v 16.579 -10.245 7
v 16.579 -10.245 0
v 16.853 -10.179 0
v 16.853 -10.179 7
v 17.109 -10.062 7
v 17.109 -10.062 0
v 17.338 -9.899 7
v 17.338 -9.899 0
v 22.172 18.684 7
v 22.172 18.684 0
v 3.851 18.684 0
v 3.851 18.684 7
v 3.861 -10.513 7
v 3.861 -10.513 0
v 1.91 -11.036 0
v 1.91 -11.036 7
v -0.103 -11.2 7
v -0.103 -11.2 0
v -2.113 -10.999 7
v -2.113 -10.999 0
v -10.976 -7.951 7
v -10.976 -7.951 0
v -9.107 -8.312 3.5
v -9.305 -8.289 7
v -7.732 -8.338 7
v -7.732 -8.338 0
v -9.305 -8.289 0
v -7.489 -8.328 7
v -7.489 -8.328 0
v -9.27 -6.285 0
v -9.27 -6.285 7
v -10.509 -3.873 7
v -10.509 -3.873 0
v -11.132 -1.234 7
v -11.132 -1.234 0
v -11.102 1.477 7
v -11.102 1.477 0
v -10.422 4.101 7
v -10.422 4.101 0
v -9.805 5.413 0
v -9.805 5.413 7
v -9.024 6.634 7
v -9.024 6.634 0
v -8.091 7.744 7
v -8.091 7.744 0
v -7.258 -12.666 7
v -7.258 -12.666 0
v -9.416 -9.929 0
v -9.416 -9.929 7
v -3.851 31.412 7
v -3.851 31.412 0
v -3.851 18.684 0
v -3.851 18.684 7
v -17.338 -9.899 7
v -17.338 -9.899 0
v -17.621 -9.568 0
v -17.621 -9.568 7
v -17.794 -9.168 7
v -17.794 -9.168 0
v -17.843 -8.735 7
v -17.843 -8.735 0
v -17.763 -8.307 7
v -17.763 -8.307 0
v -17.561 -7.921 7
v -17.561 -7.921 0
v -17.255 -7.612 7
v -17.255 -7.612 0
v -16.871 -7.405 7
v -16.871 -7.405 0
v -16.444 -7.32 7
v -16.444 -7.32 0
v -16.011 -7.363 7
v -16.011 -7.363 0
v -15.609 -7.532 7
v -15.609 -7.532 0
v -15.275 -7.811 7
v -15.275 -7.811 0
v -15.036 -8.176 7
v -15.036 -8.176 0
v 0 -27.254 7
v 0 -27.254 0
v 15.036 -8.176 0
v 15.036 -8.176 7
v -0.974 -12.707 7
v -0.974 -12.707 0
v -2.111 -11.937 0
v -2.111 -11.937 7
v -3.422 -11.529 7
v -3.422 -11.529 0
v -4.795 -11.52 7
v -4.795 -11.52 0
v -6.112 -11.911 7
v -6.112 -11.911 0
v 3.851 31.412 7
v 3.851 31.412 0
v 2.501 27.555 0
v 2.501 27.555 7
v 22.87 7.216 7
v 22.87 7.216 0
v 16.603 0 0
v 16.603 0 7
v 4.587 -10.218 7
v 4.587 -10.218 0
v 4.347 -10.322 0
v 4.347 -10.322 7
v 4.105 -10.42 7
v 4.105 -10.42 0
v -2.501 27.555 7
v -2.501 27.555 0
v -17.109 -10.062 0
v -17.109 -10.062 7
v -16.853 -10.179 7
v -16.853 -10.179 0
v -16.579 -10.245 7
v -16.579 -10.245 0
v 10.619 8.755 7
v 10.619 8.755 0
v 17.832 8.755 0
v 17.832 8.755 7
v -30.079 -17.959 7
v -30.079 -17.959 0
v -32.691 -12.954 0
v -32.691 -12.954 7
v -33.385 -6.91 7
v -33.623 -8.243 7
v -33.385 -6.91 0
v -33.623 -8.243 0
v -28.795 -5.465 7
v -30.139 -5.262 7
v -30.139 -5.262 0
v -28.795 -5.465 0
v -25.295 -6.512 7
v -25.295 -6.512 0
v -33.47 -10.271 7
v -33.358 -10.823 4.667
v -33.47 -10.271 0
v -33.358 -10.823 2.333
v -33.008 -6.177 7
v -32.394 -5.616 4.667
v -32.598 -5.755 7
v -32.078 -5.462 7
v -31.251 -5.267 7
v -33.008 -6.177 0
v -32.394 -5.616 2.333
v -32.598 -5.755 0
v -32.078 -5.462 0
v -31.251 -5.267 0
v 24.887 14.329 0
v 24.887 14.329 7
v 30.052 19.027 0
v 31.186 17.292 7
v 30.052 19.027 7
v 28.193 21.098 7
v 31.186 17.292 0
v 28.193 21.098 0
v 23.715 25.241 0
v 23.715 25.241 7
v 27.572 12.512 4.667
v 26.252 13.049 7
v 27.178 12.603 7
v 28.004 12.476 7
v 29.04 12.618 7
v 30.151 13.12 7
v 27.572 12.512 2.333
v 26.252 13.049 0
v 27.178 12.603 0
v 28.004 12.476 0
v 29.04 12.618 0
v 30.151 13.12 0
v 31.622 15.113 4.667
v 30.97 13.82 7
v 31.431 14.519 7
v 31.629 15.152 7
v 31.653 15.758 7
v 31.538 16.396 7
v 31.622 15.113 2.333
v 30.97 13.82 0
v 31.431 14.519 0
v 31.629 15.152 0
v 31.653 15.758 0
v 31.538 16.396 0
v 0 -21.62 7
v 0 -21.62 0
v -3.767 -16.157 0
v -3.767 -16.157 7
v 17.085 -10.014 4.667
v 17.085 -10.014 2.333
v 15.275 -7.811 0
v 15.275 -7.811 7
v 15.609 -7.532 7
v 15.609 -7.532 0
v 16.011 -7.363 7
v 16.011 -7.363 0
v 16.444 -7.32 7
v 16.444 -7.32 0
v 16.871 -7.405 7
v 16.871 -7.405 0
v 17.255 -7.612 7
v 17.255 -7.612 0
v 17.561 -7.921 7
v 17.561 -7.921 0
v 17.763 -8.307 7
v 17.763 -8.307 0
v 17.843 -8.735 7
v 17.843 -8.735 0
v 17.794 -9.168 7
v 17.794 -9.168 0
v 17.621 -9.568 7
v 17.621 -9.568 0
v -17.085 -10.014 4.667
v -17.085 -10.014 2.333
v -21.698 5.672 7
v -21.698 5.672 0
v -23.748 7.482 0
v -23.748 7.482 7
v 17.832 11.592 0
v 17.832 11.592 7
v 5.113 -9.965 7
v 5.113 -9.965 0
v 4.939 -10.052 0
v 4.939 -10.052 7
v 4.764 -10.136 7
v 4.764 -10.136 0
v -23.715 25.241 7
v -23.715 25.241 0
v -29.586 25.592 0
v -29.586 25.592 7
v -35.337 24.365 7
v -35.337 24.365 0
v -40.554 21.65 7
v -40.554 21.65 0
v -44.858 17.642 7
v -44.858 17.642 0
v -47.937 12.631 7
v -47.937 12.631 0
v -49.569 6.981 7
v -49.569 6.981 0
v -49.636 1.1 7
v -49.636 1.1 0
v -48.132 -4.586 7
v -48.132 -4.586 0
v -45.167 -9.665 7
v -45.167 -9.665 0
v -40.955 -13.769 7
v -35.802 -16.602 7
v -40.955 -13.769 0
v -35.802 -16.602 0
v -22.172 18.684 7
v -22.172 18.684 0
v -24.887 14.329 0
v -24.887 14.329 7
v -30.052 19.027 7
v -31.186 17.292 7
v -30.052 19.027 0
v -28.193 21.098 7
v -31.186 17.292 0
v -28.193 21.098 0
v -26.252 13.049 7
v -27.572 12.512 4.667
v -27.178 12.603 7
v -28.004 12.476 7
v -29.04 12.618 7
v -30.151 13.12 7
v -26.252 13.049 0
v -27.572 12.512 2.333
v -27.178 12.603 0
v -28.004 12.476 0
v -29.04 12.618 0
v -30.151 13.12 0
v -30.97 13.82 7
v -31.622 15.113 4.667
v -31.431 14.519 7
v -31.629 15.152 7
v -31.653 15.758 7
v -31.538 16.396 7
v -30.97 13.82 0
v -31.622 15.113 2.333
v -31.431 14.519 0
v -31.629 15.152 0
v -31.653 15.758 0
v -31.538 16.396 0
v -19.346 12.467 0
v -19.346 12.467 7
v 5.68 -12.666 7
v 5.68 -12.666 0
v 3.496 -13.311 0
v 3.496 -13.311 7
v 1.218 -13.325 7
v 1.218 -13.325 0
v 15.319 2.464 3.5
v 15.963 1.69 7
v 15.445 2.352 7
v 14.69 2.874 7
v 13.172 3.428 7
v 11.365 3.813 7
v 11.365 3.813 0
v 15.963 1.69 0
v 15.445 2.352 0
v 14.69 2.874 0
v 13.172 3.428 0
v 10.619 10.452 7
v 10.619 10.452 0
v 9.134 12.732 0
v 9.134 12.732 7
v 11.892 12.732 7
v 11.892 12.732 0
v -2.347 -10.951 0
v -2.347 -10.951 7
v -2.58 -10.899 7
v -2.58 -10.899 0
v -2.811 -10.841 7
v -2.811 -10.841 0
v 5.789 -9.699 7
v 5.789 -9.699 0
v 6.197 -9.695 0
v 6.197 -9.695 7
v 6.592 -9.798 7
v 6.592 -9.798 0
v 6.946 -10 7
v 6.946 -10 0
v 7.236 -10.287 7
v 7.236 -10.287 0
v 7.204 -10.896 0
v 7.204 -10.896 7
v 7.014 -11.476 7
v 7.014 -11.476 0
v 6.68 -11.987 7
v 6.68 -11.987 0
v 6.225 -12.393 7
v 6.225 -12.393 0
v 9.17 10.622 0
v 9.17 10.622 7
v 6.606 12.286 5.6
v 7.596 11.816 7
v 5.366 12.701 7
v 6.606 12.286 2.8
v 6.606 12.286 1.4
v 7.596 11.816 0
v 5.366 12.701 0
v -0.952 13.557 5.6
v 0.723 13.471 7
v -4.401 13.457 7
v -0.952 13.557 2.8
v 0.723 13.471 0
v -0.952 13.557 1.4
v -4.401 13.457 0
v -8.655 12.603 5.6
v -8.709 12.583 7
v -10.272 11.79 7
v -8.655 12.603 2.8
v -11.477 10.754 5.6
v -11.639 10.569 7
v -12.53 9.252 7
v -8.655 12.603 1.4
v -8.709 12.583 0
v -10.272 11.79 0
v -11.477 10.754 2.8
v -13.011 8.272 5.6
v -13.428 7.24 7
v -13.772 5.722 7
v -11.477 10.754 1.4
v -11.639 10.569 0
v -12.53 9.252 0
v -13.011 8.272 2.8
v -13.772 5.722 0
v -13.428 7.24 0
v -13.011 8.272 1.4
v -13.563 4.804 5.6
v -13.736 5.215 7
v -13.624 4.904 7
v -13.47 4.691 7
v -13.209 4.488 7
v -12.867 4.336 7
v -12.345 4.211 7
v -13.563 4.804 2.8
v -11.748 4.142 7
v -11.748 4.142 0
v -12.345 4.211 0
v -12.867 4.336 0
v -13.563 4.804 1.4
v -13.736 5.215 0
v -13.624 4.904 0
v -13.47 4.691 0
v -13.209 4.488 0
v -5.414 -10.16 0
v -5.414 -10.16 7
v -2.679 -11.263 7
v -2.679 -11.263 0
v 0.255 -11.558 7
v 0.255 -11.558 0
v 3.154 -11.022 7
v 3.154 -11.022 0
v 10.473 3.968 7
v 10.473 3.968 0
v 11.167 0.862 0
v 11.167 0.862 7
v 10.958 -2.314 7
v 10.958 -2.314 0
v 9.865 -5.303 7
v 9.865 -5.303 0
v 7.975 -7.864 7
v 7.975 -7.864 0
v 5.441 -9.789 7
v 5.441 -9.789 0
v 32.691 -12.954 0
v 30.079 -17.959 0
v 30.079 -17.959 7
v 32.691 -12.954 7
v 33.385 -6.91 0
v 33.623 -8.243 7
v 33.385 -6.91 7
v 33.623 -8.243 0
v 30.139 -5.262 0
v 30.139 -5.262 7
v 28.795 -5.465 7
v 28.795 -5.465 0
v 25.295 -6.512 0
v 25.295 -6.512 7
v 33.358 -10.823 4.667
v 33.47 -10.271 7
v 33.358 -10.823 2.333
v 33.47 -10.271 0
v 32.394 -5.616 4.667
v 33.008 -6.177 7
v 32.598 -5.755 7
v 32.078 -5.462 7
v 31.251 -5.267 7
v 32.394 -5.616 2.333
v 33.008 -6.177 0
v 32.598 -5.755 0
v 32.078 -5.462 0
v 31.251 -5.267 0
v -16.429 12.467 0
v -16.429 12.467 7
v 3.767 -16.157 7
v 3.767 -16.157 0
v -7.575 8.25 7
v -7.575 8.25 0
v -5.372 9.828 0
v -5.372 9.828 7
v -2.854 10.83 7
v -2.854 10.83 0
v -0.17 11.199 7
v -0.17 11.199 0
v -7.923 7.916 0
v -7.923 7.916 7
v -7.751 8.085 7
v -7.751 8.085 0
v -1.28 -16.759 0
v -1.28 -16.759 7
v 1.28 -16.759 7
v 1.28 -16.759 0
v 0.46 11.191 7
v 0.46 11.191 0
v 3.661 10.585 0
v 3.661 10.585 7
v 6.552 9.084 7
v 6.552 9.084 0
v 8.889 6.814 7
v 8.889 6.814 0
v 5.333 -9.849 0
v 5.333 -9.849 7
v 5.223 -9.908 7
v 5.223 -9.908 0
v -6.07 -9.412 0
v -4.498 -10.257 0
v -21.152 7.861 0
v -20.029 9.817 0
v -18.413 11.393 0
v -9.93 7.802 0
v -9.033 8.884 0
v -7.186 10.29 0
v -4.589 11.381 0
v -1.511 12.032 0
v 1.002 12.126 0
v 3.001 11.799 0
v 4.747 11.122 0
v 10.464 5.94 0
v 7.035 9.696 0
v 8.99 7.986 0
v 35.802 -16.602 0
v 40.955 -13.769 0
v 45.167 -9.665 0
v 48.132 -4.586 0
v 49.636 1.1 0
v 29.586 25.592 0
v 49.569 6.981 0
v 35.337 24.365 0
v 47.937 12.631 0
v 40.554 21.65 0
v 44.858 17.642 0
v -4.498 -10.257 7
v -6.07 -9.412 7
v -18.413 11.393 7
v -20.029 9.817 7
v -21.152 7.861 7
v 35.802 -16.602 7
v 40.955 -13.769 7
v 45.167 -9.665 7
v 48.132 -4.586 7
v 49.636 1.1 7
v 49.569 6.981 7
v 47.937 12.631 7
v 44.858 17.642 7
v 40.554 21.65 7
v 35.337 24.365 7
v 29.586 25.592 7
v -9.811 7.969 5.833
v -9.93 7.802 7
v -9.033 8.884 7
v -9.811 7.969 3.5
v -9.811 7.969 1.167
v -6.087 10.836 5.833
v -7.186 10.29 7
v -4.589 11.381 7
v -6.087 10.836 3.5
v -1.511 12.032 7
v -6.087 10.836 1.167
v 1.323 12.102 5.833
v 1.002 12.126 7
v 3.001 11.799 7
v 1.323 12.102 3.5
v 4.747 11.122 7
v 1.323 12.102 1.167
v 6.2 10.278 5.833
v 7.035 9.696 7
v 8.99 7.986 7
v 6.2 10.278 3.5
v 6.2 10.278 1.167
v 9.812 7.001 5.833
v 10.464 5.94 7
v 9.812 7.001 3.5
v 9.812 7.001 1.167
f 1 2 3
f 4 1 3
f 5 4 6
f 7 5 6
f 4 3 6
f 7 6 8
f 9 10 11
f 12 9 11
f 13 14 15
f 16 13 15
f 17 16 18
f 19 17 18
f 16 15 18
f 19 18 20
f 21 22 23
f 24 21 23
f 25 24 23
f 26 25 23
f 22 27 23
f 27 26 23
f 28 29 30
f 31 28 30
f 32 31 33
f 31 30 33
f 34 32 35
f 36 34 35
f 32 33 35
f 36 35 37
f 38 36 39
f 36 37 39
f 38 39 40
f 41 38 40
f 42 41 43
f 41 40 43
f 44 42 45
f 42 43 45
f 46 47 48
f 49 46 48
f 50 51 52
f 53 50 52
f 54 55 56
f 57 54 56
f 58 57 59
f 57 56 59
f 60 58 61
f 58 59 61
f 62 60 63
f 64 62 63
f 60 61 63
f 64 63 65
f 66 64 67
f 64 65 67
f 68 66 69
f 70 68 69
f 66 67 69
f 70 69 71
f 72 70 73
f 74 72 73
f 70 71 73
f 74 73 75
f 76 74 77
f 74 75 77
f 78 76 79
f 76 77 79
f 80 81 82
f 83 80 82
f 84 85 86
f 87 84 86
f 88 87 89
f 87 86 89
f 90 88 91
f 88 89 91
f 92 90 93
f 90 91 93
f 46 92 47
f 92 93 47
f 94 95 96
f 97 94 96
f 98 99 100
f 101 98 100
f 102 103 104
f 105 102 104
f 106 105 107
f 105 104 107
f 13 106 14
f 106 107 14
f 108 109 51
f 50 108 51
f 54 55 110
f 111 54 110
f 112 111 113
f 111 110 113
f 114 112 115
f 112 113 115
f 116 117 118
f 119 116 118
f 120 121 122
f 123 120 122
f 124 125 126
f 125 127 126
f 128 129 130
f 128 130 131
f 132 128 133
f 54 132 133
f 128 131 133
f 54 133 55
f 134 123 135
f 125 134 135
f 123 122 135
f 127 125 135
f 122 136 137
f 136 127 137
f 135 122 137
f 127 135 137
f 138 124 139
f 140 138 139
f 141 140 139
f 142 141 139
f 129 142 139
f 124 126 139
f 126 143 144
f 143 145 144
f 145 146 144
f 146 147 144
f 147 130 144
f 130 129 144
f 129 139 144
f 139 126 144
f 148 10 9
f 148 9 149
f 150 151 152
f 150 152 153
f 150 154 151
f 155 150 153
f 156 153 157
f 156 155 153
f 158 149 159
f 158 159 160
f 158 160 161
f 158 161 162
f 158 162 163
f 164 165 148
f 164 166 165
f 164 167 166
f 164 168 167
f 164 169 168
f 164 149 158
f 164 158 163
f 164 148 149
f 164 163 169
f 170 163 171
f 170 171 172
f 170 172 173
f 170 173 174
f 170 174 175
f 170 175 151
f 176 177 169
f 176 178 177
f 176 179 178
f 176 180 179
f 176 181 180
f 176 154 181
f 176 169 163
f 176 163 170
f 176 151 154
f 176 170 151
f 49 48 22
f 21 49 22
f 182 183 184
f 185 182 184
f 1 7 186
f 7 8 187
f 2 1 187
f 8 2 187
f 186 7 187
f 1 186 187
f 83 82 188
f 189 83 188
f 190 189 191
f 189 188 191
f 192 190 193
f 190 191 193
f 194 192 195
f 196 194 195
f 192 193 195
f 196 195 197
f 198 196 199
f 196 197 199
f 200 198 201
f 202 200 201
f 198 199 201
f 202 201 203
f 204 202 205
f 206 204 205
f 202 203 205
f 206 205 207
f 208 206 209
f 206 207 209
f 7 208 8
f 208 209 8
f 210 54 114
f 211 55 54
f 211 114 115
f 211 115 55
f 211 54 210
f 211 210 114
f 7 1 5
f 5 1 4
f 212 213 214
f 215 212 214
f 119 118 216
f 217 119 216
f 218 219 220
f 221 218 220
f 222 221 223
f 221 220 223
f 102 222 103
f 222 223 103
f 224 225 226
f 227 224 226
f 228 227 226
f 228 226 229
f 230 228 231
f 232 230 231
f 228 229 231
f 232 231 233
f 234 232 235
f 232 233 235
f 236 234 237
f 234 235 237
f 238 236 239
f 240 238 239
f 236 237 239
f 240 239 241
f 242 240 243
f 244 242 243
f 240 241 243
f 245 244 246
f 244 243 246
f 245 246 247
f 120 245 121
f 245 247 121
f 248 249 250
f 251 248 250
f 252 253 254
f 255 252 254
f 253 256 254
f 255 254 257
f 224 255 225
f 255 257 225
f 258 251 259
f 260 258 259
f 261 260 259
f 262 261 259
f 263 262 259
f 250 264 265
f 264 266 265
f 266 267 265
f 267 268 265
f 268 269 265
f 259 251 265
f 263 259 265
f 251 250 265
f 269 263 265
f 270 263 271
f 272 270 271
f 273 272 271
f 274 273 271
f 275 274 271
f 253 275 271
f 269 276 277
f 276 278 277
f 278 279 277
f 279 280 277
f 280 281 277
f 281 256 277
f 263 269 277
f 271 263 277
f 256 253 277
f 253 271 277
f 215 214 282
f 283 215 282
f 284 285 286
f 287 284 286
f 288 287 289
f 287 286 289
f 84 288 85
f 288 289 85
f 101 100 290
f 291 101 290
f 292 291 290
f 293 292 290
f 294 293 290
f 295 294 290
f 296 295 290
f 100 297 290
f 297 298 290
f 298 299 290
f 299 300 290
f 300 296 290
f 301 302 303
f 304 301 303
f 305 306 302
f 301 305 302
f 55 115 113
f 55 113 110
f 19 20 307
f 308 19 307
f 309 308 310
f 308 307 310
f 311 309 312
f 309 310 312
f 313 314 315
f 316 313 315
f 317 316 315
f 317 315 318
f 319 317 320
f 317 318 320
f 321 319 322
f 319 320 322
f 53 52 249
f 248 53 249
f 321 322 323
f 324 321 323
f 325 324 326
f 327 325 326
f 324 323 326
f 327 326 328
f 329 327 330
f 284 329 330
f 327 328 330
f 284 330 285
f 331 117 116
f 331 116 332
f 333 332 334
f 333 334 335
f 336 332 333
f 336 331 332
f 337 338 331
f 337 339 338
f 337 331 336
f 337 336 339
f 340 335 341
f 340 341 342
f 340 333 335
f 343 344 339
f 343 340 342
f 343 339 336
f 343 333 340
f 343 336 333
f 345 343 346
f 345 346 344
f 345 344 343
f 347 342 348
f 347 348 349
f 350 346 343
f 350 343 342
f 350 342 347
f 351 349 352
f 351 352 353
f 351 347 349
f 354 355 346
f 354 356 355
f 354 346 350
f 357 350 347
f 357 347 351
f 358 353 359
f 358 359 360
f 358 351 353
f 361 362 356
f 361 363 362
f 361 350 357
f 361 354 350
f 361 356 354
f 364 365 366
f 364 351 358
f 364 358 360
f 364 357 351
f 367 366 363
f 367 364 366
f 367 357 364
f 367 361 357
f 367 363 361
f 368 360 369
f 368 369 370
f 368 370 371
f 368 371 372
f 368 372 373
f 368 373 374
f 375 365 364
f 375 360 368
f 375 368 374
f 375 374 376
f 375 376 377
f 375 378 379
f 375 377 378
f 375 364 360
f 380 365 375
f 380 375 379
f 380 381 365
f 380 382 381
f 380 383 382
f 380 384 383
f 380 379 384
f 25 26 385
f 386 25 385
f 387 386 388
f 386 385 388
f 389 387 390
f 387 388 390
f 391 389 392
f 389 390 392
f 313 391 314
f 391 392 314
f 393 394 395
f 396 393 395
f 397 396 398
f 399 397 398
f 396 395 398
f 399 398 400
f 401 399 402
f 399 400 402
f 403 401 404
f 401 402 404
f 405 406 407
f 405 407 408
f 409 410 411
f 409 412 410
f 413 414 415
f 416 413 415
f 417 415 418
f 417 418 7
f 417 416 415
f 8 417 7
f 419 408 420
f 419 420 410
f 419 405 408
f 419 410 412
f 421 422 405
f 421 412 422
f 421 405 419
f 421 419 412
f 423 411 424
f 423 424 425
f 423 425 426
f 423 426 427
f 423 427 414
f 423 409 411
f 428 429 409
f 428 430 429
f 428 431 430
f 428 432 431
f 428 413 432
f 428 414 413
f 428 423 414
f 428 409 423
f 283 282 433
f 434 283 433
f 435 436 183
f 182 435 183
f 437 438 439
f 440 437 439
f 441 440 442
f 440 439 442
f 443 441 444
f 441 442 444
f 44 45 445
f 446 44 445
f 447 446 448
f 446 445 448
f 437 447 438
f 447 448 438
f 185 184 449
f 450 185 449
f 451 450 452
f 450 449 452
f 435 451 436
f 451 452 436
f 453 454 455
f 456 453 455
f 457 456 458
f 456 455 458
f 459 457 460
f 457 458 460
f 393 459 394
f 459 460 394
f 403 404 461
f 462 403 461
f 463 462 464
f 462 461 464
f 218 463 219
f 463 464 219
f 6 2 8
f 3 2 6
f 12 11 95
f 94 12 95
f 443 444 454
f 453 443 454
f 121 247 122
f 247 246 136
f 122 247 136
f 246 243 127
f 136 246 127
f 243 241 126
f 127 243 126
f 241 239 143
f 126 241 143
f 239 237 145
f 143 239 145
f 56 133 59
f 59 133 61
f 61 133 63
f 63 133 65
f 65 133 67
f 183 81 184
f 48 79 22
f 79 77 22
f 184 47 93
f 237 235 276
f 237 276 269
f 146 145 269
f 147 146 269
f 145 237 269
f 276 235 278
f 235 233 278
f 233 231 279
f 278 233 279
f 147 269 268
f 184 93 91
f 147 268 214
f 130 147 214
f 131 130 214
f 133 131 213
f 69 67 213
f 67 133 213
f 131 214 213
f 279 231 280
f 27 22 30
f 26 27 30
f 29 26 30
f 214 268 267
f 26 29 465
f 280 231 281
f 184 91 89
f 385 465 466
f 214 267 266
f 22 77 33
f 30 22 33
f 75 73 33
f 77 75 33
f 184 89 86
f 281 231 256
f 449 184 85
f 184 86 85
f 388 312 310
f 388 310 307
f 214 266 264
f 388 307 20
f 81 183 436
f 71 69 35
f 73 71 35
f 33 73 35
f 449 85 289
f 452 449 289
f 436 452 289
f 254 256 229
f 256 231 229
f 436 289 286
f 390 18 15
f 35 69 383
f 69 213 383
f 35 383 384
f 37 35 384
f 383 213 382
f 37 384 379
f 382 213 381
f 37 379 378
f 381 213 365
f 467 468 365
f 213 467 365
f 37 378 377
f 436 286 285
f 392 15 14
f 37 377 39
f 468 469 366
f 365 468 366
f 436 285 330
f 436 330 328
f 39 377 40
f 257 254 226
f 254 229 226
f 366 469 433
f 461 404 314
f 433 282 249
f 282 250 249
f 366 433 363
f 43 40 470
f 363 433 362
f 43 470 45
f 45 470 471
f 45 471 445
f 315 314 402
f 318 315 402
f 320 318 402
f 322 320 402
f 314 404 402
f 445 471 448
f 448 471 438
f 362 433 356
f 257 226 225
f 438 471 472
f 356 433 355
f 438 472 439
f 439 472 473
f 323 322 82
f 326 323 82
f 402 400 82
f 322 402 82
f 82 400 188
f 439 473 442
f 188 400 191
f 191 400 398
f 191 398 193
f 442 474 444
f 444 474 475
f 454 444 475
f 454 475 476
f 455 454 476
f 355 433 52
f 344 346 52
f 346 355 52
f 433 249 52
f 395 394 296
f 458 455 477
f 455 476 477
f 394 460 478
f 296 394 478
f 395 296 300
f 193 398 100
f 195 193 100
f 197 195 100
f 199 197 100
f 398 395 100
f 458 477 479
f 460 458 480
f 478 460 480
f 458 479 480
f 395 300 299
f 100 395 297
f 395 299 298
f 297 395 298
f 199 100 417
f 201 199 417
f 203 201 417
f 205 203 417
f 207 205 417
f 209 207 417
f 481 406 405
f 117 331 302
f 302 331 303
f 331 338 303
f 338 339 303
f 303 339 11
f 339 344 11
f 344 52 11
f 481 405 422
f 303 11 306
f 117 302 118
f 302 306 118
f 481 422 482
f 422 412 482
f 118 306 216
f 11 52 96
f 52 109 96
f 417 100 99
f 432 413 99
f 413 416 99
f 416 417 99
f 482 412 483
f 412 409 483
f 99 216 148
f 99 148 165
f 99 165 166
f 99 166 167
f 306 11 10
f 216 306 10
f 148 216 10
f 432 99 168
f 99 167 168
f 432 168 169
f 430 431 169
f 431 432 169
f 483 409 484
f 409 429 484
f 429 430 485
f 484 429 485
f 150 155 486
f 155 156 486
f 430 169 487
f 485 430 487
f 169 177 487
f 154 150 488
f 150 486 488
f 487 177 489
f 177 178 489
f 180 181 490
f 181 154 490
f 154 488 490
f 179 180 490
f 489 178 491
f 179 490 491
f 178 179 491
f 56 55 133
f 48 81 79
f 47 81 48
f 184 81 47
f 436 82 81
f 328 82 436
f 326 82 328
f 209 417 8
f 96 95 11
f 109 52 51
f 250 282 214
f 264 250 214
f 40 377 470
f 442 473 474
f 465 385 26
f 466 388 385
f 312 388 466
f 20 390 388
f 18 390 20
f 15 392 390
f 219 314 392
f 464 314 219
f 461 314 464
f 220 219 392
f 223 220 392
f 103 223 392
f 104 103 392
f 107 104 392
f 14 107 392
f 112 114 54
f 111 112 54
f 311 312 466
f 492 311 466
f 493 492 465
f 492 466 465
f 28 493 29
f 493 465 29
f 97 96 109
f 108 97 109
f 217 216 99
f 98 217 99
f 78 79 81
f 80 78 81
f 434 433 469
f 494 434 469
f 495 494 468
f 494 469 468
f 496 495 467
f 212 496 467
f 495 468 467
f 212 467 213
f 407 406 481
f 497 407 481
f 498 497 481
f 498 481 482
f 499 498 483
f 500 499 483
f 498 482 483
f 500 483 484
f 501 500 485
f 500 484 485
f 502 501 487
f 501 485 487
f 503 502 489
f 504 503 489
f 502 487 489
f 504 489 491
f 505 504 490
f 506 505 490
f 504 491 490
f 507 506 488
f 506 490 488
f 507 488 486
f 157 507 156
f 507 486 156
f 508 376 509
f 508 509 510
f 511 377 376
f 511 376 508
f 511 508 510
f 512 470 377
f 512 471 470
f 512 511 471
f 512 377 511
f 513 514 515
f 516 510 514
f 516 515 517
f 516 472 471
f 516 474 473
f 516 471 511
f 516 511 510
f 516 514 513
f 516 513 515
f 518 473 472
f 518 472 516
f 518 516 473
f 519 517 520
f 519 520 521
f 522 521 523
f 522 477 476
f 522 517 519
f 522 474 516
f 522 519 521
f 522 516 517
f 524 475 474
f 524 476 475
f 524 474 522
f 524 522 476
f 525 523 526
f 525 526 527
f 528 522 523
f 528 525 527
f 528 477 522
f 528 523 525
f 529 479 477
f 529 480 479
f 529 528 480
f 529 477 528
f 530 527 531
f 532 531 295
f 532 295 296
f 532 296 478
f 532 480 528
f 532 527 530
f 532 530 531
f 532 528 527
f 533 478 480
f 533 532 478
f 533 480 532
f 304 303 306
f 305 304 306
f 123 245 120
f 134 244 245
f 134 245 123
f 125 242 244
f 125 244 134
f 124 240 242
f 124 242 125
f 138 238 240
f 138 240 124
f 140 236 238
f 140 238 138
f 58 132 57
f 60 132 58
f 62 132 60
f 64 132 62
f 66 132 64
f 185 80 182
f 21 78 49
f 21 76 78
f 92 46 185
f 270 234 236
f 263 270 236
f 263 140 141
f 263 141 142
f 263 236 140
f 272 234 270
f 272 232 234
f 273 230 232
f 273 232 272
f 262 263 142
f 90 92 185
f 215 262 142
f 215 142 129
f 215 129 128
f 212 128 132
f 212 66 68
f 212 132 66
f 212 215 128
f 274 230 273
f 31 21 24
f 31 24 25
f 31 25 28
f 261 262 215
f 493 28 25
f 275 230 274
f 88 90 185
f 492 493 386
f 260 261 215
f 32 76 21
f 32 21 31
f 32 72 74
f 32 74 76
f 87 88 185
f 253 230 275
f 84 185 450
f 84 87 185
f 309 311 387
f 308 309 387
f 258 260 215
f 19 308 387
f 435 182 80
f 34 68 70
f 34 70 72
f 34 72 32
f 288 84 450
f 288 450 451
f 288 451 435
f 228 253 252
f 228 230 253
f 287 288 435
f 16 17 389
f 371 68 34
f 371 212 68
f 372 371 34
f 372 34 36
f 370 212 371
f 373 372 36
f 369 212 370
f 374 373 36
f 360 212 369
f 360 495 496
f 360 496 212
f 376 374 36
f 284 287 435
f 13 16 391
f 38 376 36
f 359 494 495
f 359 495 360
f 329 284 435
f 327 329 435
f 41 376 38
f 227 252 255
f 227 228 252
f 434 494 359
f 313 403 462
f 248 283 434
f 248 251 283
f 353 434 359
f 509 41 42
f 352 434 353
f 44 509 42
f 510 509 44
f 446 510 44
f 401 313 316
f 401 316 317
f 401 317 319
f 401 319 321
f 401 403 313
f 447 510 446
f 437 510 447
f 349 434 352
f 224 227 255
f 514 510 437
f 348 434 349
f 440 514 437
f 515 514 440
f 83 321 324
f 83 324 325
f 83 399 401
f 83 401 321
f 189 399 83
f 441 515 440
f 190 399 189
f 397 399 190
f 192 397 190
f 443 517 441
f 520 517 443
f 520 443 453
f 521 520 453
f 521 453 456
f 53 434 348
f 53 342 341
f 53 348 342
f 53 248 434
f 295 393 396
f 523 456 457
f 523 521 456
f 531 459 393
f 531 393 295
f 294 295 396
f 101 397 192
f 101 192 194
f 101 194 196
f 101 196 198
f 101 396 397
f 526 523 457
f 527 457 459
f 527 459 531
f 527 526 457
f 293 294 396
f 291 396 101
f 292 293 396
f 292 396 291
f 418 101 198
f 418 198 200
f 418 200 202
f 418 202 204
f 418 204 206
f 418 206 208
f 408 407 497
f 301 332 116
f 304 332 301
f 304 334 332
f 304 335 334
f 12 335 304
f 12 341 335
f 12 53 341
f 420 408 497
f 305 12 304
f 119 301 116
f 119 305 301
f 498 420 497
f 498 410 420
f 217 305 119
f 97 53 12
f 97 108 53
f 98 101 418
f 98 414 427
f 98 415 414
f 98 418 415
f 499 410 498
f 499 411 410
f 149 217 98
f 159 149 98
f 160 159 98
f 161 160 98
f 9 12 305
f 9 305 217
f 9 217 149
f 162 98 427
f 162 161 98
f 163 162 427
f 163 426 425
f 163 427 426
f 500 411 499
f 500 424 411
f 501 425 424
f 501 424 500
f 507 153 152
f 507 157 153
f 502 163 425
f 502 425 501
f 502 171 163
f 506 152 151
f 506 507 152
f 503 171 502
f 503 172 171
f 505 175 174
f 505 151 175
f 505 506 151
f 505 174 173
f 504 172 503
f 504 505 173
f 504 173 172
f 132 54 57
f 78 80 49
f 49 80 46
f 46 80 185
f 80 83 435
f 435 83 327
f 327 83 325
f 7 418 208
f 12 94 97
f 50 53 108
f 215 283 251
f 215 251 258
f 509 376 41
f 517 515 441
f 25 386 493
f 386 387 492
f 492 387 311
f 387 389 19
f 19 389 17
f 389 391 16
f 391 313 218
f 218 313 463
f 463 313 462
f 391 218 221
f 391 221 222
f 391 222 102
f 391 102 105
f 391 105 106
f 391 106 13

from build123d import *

# Parameters (mm, degrees)
F1_DEPTH = 7


# Not quite as in the source:
# - a feature names something its author has since deleted; it is built from what else it names


with BuildPart() as f1:
    # F0 (on Top) → F1 (new body)
    with BuildSketch(Plane.XY):
        with BuildLine():
            ThreePointArc((16.5792349726, -10.2448631078), (16.9834682398, -10.1267607204), (17.3376568133, -9.8989380643))
            add(Edge.make_bspline(
                [(17.3376568133, -9.8989380643), (17.0850021821, -10.01408297), (16.8321185773, -10.1294730389), (16.5792349726, -10.2448631078)],
                knots=[0.9832167043, 0.9832167043, 0.9832167043, 0.9832167043, 1, 1, 1, 1], degree=3))
        make_face()
    extrude(amount=F1_DEPTH)


with BuildPart() as f1b:
    # F0 (on Top) → F1, piece 2 (new body)
    with BuildSketch(Plane.XY):
        with BuildLine():
            add(Edge.make_bspline(
                [(-17.3376568133, -9.8989380643), (-17.0850021821, -10.01408297), (-16.8321185773, -10.1294730389), (-16.5792349726, -10.2448631078)],
                knots=[0.9832167043, 0.9832167043, 0.9832167043, 0.9832167043, 1, 1, 1, 1], degree=3))
            ThreePointArc((-17.3376568133, -9.8989380643), (-16.9834682398, -10.1267607204), (-16.5792349726, -10.2448631078))
        make_face()
    extrude(amount=F1_DEPTH)


with BuildPart() as f1c:
    # F0 (on Top) → F1, piece 3 (new body)
    with BuildSketch(Plane.XY):
        with BuildLine():
            Line((-3.8506640121, 25.8194226772), (-3.8506640121, 18.6837073416))
            Line((-3.8506640121, 18.6837073416), (-22.1720933914, 18.6837073416))
            add(Edge.make_bspline(
                [(-22.1720933914, 18.6837073416), (-23.7664845821, 15.772799918), (-26.5823710911, 10.6317874798), (-34.6816663683, 15.4985414684), (-27.9134744848, 21.511081938), (-23.7149503082, 25.2408515662)],
                knots=[0, 0, 0, 0, 0.3313598243, 0.5852212834, 1, 1, 1, 1], degree=3))
            ThreePointArc((-23.7149503082, 25.2408515662), (-49.5692789527, 6.9809498228), (-30.0792362541, -17.9591495544))
            add(Edge.make_bspline(
                [(-30.0792362541, -17.9591495544), (-31.4287635496, -15.6693361188), (-33.8865169415, -11.4991375929), (-33.716724634, -2.5786683332), (-23.7541469989, -6.9746846915), (-17.3376568133, -9.8989380643)],
                knots=[0, 0, 0, 0, 0.3058338248, 0.5569832657, 0.9832167043, 0.9832167043, 0.9832167043, 0.9832167043], degree=3))
            ThreePointArc((-17.3376568133, -9.8989380643), (-17.2546789352, -7.6115300309), (-15.0363789871, -8.1756808795))
            Line((-15.0363789871, -8.1756808795), (0, -27.2537693381))
            Line((0, -27.2537693381), (15.0363789871, -8.1756808795))
            ThreePointArc((15.0363789871, -8.1756808795), (17.2546789352, -7.6115300309), (17.3376568133, -9.8989380643))
            add(Edge.make_bspline(
                [(30.0792362541, -17.9591495544), (31.4287635496, -15.6693361188), (33.8865169415, -11.4991375929), (33.716724634, -2.5786683332), (23.7541469989, -6.9746846915), (17.3376568133, -9.8989380643)],
                knots=[0, 0, 0, 0, 0.3058338248, 0.5569832657, 0.9832167043, 0.9832167043, 0.9832167043, 0.9832167043], degree=3))
            ThreePointArc((30.0792362541, -17.9591495544), (49.5692789527, 6.9809498228), (23.7149503082, 25.2408515662))
            add(Edge.make_bspline(
                [(22.1720933914, 18.6837073416), (23.7664845821, 15.772799918), (26.5823710911, 10.6317874798), (34.6816663683, 15.4985414684), (27.9134744848, 21.511081938), (23.7149503082, 25.2408515662)],
                knots=[0, 0, 0, 0, 0.3313598243, 0.5852212834, 1, 1, 1, 1], degree=3))
            Line((22.1720933914, 18.6837073416), (3.8506640121, 18.6837073416))
            Line((3.8506640121, 18.6837073416), (3.8506640121, 25.8194226772))
            Line((3.8506640121, 25.8194226772), (3.8506640121, 31.412281096))
            Line((3.8506640121, 31.412281096), (2.5006639771, 27.5551360101))
            Line((2.5006639771, 27.5551360101), (0, 27.5551360101))
            Line((0, 27.5551360101), (-2.5006639771, 27.5551360101))
            Line((-2.5006639771, 27.5551360101), (-3.8506640121, 31.412281096))
            Line((-3.8506640121, 31.412281096), (-3.8506640121, 25.8194226772))
        make_face()
        Polygon((-20.2526636422, 15.1130193844), (0, 15.1130193844), (20.2526636422, 15.1130193844), (26.1378940195, 8.3870412782), (0, -24.7384030372), (-26.1378940195, 8.3870412782), align=None, mode=Mode.SUBTRACT)
        Polygon((20.2526636422, 15.1130193844), (0, 15.1130193844), (-20.2526636422, 15.1130193844), (-26.1378940195, 8.3870412782), (0, -24.7384030372), (26.1378940195, 8.3870412782), align=None)
        with BuildLine():
            Line((0, -21.6201487929), (-3.766995389, -16.1573626101))
            ThreePointArc((-3.766995389, -16.1573626101), (0, -16.8352683554), (3.766995389, -16.1573626101))
            Line((3.766995389, -16.1573626101), (0, -21.6201487929))
        make_face(mode=Mode.SUBTRACT)
        with BuildLine():
            add(Edge.make_bspline(
                [(11.3654661838, 3.8127656249), (11.0702905387, 3.8658966707), (10.7717963194, 3.9170817546), (10.4734106347, 3.9683333625)],
                knots=[0.9102418538, 0.9102418538, 0.9102418538, 0.9102418538, 1, 1, 1, 1], degree=3))
            ThreePointArc((10.4734106347, 3.9683333625), (10.5184572741, -3.8473440933), (5.4412195451, -9.7894397114))
            ThreePointArc((5.4412195451, -9.7894397114), (5.6124095819, -9.7340283467), (5.7888518665, -9.6987499078))
            ThreePointArc((5.7888518665, -9.6987499078), (6.5915164137, -9.7983213926), (7.2357721967, -10.2873196974))
            ThreePointArc((7.2357721967, -10.2873196974), (6.8639840342, -11.7423461015), (5.6799273007, -12.666109018))
            ThreePointArc((5.6799273007, -12.666109018), (2.3573584338, -13.3979774494), (-0.9739922243, -12.7071822062))
            ThreePointArc((-0.9739922243, -12.7071822062), (-4.1081974234, -11.4743163831), (-7.2582499124, -12.666109018))
            Line((-7.2582499124, -12.666109018), (-9.4156803641, -9.9287711898))
            Line((-9.4156803641, -9.9287711898), (-10.9763270325, -7.9509104535))
            add(Edge.make_bspline(
                [(-10.9763270325, -7.9509104535), (-10.3428475671, -8.1020396785), (-9.2143948724, -8.3670340298), (-8.1833899777, -8.3551484222), (-7.7320225253, -8.3383332333)],
                knots=[0, 0, 0, 0, 0.5203503372, 0.9269013897, 0.9269013897, 0.9269013897, 0.9269013897], degree=3))
            add(Edge.make_bspline(
                [(-7.7320225253, -8.3383332333), (-7.6508658457, -8.3353098321), (-7.569736476, -8.3319113533), (-7.488530354, -8.3283799827)],
                knots=[0.9269013897, 0.9269013897, 0.9269013897, 0.9269013897, 1, 1, 1, 1], degree=3))
            ThreePointArc((-7.488530354, -8.3283799827), (-10.9005534004, -2.572534852), (-10.421984849, 4.1014914125))
            add(Edge.make_bspline(
                [(-11.7478008935, 4.1423421903), (-11.3286185316, 4.111655498), (-10.8755128269, 4.1066551355), (-10.421984849, 4.1014914125)],
                knots=[0.9507604249, 0.9507604249, 0.9507604249, 0.9507604249, 1, 1, 1, 1], degree=3))
            add(Edge.make_bspline(
                [(10.6188114733, 8.7546054274), (9.7238694578, 10.0752930999), (7.317364425, 13.6266079113), (-9.4942346395, 14.2413402565), (-13.0198623921, 8.8144018215), (-14.3381284396, 4.6074785308), (-12.5637633708, 4.2020755945), (-11.7478008935, 4.1423421903)],
                knots=[0, 0, 0, 0, 0.1869763466, 0.5029361243, 0.7033603953, 0.8549127717, 0.9507604249, 0.9507604249, 0.9507604249, 0.9507604249], degree=3))
            Line((10.6188114733, 8.7546054274), (12.9112154245, 8.7546054274))
            Line((12.9112154245, 8.7546054274), (14.2252305523, 8.7546054274))
            Line((14.2252305523, 8.7546054274), (17.8316496313, 8.7546054274))
            Line((17.8316496313, 8.7546054274), (17.8316496313, 11.5920095704))
            Line((17.8316496313, 11.5920095704), (22.8700302541, 7.2163445875))
            Line((22.8700302541, 7.2163445875), (16.6028764442, 0))
            add(Edge.make_bspline(
                [(16.6028764442, 0), (16.3378800898, 0.9165232113), (15.7718233446, 2.8802807514), (12.9602593254, 3.5257059408), (11.3654661838, 3.8127656249)],
                knots=[0, 0, 0, 0, 0.4252910171, 0.9102418538, 0.9102418538, 0.9102418538, 0.9102418538], degree=3))
        make_face(mode=Mode.SUBTRACT)
        with BuildLine():
            Line((-21.6983128122, 5.6717018071), (-23.7482488155, 7.4817519635))
            Line((-23.7482488155, 7.4817519635), (-19.3462949246, 12.4670965597))
            Line((-19.3462949246, 12.4670965597), (-16.4293367416, 12.4670965597))
            ThreePointArc((-16.4293367416, 12.4670965597), (-20.0285535224, 9.8174252893), (-21.6983128122, 5.6717018071))
        make_face(mode=Mode.SUBTRACT)
        Polygon((10.6188114733, 10.4517443106), (9.1338139027, 12.7322748303), (11.8916649371, 12.7322748303), align=None, mode=Mode.SUBTRACT)
        with BuildLine():
            ThreePointArc((5.7888518665, -9.6987499078), (5.6124095819, -9.7340283467), (5.4412195451, -9.7894397114))
            ThreePointArc((5.4412195451, -9.7894397114), (5.2779102429, -9.878444385), (5.1131454862, -9.9647249454))
            ThreePointArc((5.1131454862, -9.9647249454), (4.8515858311, -10.0946577417), (4.5867272221, -10.2177264296))
            ThreePointArc((4.5867272221, -10.2177264296), (4.2266476764, -10.3718585326), (3.8613989114, -10.5133057811))
            ThreePointArc((3.8613989114, -10.5133057811), (0.9071691587, -11.1632004424), (-2.1132312692, -10.998829647))
            ThreePointArc((-2.1132312692, -10.998829647), (-2.4633866315, -10.9257368769), (-2.8110292899, -10.8414996348))
            ThreePointArc((-2.8110292899, -10.8414996348), (-5.3008654775, -9.8661454069), (-7.488530354, -8.3283799827))
            add(Edge.make_bspline(
                [(-7.7320225253, -8.3383332333), (-7.6508658457, -8.3353098321), (-7.569736476, -8.3319113533), (-7.488530354, -8.3283799827)],
                knots=[0.9269013897, 0.9269013897, 0.9269013897, 0.9269013897, 1, 1, 1, 1], degree=3))
            ThreePointArc((-7.7320225253, -8.3383332333), (-1.22270189, -11.5143324097), (5.7888518665, -9.6987499078))
        make_face()
        with BuildLine():
            ThreePointArc((-7.5748789973, 8.2499217073), (-4.1434483054, 10.4053753484), (-0.1696203788, 11.1987155034))
            Line((-0.1696203788, 11.1987155034), (0.4601464831, 11.190543562))
            ThreePointArc((0.4601464831, 11.190543562), (6.551774405, 9.0837355832), (10.4734106347, 3.9683333625))
            add(Edge.make_bspline(
                [(11.3654661838, 3.8127656249), (11.0702905387, 3.8658966707), (10.7717963194, 3.9170817546), (10.4734106347, 3.9683333625)],
                knots=[0.9102418538, 0.9102418538, 0.9102418538, 0.9102418538, 1, 1, 1, 1], degree=3))
            add(Edge.make_bspline(
                [(-11.7478008927, 4.1423421862), (-11.1941041625, 5.4902929916), (-10.0555326267, 8.2507614708), (-6.2924585186, 11.3146577634), (1.4560057353, 12.7730545434), (6.2091952943, 10.5462199473), (10.0831340079, 7.2322332261), (10.961497048, 4.890959233), (11.3654661838, 3.8127656249)],
                knots=[0.0009795765, 0.0009795765, 0.0009795765, 0.0009795765, 0.1555024095, 0.3177552589, 0.5229639524, 0.6937681454, 0.8590519191, 1, 1, 1, 1], degree=3))
            add(Edge.make_bspline(
                [(-11.7478008935, 4.1423421903), (-11.3286185316, 4.111655498), (-10.8755128269, 4.1066551355), (-10.421984849, 4.1014914125)],
                knots=[0.9507604249, 0.9507604249, 0.9507604249, 0.9507604249, 1, 1, 1, 1], degree=3))
            ThreePointArc((-10.421984849, 4.1014914125), (-9.4341404452, 6.0363063259), (-8.0913616782, 7.7440213193))
            ThreePointArc((-8.0913616782, 7.7440213193), (-7.837203457, 8.0011400421), (-7.5748789973, 8.2499217073))
        make_face()
    extrude(amount=F1_DEPTH)


solid = Compound([f1.part, f1b.part, f1c.part])
